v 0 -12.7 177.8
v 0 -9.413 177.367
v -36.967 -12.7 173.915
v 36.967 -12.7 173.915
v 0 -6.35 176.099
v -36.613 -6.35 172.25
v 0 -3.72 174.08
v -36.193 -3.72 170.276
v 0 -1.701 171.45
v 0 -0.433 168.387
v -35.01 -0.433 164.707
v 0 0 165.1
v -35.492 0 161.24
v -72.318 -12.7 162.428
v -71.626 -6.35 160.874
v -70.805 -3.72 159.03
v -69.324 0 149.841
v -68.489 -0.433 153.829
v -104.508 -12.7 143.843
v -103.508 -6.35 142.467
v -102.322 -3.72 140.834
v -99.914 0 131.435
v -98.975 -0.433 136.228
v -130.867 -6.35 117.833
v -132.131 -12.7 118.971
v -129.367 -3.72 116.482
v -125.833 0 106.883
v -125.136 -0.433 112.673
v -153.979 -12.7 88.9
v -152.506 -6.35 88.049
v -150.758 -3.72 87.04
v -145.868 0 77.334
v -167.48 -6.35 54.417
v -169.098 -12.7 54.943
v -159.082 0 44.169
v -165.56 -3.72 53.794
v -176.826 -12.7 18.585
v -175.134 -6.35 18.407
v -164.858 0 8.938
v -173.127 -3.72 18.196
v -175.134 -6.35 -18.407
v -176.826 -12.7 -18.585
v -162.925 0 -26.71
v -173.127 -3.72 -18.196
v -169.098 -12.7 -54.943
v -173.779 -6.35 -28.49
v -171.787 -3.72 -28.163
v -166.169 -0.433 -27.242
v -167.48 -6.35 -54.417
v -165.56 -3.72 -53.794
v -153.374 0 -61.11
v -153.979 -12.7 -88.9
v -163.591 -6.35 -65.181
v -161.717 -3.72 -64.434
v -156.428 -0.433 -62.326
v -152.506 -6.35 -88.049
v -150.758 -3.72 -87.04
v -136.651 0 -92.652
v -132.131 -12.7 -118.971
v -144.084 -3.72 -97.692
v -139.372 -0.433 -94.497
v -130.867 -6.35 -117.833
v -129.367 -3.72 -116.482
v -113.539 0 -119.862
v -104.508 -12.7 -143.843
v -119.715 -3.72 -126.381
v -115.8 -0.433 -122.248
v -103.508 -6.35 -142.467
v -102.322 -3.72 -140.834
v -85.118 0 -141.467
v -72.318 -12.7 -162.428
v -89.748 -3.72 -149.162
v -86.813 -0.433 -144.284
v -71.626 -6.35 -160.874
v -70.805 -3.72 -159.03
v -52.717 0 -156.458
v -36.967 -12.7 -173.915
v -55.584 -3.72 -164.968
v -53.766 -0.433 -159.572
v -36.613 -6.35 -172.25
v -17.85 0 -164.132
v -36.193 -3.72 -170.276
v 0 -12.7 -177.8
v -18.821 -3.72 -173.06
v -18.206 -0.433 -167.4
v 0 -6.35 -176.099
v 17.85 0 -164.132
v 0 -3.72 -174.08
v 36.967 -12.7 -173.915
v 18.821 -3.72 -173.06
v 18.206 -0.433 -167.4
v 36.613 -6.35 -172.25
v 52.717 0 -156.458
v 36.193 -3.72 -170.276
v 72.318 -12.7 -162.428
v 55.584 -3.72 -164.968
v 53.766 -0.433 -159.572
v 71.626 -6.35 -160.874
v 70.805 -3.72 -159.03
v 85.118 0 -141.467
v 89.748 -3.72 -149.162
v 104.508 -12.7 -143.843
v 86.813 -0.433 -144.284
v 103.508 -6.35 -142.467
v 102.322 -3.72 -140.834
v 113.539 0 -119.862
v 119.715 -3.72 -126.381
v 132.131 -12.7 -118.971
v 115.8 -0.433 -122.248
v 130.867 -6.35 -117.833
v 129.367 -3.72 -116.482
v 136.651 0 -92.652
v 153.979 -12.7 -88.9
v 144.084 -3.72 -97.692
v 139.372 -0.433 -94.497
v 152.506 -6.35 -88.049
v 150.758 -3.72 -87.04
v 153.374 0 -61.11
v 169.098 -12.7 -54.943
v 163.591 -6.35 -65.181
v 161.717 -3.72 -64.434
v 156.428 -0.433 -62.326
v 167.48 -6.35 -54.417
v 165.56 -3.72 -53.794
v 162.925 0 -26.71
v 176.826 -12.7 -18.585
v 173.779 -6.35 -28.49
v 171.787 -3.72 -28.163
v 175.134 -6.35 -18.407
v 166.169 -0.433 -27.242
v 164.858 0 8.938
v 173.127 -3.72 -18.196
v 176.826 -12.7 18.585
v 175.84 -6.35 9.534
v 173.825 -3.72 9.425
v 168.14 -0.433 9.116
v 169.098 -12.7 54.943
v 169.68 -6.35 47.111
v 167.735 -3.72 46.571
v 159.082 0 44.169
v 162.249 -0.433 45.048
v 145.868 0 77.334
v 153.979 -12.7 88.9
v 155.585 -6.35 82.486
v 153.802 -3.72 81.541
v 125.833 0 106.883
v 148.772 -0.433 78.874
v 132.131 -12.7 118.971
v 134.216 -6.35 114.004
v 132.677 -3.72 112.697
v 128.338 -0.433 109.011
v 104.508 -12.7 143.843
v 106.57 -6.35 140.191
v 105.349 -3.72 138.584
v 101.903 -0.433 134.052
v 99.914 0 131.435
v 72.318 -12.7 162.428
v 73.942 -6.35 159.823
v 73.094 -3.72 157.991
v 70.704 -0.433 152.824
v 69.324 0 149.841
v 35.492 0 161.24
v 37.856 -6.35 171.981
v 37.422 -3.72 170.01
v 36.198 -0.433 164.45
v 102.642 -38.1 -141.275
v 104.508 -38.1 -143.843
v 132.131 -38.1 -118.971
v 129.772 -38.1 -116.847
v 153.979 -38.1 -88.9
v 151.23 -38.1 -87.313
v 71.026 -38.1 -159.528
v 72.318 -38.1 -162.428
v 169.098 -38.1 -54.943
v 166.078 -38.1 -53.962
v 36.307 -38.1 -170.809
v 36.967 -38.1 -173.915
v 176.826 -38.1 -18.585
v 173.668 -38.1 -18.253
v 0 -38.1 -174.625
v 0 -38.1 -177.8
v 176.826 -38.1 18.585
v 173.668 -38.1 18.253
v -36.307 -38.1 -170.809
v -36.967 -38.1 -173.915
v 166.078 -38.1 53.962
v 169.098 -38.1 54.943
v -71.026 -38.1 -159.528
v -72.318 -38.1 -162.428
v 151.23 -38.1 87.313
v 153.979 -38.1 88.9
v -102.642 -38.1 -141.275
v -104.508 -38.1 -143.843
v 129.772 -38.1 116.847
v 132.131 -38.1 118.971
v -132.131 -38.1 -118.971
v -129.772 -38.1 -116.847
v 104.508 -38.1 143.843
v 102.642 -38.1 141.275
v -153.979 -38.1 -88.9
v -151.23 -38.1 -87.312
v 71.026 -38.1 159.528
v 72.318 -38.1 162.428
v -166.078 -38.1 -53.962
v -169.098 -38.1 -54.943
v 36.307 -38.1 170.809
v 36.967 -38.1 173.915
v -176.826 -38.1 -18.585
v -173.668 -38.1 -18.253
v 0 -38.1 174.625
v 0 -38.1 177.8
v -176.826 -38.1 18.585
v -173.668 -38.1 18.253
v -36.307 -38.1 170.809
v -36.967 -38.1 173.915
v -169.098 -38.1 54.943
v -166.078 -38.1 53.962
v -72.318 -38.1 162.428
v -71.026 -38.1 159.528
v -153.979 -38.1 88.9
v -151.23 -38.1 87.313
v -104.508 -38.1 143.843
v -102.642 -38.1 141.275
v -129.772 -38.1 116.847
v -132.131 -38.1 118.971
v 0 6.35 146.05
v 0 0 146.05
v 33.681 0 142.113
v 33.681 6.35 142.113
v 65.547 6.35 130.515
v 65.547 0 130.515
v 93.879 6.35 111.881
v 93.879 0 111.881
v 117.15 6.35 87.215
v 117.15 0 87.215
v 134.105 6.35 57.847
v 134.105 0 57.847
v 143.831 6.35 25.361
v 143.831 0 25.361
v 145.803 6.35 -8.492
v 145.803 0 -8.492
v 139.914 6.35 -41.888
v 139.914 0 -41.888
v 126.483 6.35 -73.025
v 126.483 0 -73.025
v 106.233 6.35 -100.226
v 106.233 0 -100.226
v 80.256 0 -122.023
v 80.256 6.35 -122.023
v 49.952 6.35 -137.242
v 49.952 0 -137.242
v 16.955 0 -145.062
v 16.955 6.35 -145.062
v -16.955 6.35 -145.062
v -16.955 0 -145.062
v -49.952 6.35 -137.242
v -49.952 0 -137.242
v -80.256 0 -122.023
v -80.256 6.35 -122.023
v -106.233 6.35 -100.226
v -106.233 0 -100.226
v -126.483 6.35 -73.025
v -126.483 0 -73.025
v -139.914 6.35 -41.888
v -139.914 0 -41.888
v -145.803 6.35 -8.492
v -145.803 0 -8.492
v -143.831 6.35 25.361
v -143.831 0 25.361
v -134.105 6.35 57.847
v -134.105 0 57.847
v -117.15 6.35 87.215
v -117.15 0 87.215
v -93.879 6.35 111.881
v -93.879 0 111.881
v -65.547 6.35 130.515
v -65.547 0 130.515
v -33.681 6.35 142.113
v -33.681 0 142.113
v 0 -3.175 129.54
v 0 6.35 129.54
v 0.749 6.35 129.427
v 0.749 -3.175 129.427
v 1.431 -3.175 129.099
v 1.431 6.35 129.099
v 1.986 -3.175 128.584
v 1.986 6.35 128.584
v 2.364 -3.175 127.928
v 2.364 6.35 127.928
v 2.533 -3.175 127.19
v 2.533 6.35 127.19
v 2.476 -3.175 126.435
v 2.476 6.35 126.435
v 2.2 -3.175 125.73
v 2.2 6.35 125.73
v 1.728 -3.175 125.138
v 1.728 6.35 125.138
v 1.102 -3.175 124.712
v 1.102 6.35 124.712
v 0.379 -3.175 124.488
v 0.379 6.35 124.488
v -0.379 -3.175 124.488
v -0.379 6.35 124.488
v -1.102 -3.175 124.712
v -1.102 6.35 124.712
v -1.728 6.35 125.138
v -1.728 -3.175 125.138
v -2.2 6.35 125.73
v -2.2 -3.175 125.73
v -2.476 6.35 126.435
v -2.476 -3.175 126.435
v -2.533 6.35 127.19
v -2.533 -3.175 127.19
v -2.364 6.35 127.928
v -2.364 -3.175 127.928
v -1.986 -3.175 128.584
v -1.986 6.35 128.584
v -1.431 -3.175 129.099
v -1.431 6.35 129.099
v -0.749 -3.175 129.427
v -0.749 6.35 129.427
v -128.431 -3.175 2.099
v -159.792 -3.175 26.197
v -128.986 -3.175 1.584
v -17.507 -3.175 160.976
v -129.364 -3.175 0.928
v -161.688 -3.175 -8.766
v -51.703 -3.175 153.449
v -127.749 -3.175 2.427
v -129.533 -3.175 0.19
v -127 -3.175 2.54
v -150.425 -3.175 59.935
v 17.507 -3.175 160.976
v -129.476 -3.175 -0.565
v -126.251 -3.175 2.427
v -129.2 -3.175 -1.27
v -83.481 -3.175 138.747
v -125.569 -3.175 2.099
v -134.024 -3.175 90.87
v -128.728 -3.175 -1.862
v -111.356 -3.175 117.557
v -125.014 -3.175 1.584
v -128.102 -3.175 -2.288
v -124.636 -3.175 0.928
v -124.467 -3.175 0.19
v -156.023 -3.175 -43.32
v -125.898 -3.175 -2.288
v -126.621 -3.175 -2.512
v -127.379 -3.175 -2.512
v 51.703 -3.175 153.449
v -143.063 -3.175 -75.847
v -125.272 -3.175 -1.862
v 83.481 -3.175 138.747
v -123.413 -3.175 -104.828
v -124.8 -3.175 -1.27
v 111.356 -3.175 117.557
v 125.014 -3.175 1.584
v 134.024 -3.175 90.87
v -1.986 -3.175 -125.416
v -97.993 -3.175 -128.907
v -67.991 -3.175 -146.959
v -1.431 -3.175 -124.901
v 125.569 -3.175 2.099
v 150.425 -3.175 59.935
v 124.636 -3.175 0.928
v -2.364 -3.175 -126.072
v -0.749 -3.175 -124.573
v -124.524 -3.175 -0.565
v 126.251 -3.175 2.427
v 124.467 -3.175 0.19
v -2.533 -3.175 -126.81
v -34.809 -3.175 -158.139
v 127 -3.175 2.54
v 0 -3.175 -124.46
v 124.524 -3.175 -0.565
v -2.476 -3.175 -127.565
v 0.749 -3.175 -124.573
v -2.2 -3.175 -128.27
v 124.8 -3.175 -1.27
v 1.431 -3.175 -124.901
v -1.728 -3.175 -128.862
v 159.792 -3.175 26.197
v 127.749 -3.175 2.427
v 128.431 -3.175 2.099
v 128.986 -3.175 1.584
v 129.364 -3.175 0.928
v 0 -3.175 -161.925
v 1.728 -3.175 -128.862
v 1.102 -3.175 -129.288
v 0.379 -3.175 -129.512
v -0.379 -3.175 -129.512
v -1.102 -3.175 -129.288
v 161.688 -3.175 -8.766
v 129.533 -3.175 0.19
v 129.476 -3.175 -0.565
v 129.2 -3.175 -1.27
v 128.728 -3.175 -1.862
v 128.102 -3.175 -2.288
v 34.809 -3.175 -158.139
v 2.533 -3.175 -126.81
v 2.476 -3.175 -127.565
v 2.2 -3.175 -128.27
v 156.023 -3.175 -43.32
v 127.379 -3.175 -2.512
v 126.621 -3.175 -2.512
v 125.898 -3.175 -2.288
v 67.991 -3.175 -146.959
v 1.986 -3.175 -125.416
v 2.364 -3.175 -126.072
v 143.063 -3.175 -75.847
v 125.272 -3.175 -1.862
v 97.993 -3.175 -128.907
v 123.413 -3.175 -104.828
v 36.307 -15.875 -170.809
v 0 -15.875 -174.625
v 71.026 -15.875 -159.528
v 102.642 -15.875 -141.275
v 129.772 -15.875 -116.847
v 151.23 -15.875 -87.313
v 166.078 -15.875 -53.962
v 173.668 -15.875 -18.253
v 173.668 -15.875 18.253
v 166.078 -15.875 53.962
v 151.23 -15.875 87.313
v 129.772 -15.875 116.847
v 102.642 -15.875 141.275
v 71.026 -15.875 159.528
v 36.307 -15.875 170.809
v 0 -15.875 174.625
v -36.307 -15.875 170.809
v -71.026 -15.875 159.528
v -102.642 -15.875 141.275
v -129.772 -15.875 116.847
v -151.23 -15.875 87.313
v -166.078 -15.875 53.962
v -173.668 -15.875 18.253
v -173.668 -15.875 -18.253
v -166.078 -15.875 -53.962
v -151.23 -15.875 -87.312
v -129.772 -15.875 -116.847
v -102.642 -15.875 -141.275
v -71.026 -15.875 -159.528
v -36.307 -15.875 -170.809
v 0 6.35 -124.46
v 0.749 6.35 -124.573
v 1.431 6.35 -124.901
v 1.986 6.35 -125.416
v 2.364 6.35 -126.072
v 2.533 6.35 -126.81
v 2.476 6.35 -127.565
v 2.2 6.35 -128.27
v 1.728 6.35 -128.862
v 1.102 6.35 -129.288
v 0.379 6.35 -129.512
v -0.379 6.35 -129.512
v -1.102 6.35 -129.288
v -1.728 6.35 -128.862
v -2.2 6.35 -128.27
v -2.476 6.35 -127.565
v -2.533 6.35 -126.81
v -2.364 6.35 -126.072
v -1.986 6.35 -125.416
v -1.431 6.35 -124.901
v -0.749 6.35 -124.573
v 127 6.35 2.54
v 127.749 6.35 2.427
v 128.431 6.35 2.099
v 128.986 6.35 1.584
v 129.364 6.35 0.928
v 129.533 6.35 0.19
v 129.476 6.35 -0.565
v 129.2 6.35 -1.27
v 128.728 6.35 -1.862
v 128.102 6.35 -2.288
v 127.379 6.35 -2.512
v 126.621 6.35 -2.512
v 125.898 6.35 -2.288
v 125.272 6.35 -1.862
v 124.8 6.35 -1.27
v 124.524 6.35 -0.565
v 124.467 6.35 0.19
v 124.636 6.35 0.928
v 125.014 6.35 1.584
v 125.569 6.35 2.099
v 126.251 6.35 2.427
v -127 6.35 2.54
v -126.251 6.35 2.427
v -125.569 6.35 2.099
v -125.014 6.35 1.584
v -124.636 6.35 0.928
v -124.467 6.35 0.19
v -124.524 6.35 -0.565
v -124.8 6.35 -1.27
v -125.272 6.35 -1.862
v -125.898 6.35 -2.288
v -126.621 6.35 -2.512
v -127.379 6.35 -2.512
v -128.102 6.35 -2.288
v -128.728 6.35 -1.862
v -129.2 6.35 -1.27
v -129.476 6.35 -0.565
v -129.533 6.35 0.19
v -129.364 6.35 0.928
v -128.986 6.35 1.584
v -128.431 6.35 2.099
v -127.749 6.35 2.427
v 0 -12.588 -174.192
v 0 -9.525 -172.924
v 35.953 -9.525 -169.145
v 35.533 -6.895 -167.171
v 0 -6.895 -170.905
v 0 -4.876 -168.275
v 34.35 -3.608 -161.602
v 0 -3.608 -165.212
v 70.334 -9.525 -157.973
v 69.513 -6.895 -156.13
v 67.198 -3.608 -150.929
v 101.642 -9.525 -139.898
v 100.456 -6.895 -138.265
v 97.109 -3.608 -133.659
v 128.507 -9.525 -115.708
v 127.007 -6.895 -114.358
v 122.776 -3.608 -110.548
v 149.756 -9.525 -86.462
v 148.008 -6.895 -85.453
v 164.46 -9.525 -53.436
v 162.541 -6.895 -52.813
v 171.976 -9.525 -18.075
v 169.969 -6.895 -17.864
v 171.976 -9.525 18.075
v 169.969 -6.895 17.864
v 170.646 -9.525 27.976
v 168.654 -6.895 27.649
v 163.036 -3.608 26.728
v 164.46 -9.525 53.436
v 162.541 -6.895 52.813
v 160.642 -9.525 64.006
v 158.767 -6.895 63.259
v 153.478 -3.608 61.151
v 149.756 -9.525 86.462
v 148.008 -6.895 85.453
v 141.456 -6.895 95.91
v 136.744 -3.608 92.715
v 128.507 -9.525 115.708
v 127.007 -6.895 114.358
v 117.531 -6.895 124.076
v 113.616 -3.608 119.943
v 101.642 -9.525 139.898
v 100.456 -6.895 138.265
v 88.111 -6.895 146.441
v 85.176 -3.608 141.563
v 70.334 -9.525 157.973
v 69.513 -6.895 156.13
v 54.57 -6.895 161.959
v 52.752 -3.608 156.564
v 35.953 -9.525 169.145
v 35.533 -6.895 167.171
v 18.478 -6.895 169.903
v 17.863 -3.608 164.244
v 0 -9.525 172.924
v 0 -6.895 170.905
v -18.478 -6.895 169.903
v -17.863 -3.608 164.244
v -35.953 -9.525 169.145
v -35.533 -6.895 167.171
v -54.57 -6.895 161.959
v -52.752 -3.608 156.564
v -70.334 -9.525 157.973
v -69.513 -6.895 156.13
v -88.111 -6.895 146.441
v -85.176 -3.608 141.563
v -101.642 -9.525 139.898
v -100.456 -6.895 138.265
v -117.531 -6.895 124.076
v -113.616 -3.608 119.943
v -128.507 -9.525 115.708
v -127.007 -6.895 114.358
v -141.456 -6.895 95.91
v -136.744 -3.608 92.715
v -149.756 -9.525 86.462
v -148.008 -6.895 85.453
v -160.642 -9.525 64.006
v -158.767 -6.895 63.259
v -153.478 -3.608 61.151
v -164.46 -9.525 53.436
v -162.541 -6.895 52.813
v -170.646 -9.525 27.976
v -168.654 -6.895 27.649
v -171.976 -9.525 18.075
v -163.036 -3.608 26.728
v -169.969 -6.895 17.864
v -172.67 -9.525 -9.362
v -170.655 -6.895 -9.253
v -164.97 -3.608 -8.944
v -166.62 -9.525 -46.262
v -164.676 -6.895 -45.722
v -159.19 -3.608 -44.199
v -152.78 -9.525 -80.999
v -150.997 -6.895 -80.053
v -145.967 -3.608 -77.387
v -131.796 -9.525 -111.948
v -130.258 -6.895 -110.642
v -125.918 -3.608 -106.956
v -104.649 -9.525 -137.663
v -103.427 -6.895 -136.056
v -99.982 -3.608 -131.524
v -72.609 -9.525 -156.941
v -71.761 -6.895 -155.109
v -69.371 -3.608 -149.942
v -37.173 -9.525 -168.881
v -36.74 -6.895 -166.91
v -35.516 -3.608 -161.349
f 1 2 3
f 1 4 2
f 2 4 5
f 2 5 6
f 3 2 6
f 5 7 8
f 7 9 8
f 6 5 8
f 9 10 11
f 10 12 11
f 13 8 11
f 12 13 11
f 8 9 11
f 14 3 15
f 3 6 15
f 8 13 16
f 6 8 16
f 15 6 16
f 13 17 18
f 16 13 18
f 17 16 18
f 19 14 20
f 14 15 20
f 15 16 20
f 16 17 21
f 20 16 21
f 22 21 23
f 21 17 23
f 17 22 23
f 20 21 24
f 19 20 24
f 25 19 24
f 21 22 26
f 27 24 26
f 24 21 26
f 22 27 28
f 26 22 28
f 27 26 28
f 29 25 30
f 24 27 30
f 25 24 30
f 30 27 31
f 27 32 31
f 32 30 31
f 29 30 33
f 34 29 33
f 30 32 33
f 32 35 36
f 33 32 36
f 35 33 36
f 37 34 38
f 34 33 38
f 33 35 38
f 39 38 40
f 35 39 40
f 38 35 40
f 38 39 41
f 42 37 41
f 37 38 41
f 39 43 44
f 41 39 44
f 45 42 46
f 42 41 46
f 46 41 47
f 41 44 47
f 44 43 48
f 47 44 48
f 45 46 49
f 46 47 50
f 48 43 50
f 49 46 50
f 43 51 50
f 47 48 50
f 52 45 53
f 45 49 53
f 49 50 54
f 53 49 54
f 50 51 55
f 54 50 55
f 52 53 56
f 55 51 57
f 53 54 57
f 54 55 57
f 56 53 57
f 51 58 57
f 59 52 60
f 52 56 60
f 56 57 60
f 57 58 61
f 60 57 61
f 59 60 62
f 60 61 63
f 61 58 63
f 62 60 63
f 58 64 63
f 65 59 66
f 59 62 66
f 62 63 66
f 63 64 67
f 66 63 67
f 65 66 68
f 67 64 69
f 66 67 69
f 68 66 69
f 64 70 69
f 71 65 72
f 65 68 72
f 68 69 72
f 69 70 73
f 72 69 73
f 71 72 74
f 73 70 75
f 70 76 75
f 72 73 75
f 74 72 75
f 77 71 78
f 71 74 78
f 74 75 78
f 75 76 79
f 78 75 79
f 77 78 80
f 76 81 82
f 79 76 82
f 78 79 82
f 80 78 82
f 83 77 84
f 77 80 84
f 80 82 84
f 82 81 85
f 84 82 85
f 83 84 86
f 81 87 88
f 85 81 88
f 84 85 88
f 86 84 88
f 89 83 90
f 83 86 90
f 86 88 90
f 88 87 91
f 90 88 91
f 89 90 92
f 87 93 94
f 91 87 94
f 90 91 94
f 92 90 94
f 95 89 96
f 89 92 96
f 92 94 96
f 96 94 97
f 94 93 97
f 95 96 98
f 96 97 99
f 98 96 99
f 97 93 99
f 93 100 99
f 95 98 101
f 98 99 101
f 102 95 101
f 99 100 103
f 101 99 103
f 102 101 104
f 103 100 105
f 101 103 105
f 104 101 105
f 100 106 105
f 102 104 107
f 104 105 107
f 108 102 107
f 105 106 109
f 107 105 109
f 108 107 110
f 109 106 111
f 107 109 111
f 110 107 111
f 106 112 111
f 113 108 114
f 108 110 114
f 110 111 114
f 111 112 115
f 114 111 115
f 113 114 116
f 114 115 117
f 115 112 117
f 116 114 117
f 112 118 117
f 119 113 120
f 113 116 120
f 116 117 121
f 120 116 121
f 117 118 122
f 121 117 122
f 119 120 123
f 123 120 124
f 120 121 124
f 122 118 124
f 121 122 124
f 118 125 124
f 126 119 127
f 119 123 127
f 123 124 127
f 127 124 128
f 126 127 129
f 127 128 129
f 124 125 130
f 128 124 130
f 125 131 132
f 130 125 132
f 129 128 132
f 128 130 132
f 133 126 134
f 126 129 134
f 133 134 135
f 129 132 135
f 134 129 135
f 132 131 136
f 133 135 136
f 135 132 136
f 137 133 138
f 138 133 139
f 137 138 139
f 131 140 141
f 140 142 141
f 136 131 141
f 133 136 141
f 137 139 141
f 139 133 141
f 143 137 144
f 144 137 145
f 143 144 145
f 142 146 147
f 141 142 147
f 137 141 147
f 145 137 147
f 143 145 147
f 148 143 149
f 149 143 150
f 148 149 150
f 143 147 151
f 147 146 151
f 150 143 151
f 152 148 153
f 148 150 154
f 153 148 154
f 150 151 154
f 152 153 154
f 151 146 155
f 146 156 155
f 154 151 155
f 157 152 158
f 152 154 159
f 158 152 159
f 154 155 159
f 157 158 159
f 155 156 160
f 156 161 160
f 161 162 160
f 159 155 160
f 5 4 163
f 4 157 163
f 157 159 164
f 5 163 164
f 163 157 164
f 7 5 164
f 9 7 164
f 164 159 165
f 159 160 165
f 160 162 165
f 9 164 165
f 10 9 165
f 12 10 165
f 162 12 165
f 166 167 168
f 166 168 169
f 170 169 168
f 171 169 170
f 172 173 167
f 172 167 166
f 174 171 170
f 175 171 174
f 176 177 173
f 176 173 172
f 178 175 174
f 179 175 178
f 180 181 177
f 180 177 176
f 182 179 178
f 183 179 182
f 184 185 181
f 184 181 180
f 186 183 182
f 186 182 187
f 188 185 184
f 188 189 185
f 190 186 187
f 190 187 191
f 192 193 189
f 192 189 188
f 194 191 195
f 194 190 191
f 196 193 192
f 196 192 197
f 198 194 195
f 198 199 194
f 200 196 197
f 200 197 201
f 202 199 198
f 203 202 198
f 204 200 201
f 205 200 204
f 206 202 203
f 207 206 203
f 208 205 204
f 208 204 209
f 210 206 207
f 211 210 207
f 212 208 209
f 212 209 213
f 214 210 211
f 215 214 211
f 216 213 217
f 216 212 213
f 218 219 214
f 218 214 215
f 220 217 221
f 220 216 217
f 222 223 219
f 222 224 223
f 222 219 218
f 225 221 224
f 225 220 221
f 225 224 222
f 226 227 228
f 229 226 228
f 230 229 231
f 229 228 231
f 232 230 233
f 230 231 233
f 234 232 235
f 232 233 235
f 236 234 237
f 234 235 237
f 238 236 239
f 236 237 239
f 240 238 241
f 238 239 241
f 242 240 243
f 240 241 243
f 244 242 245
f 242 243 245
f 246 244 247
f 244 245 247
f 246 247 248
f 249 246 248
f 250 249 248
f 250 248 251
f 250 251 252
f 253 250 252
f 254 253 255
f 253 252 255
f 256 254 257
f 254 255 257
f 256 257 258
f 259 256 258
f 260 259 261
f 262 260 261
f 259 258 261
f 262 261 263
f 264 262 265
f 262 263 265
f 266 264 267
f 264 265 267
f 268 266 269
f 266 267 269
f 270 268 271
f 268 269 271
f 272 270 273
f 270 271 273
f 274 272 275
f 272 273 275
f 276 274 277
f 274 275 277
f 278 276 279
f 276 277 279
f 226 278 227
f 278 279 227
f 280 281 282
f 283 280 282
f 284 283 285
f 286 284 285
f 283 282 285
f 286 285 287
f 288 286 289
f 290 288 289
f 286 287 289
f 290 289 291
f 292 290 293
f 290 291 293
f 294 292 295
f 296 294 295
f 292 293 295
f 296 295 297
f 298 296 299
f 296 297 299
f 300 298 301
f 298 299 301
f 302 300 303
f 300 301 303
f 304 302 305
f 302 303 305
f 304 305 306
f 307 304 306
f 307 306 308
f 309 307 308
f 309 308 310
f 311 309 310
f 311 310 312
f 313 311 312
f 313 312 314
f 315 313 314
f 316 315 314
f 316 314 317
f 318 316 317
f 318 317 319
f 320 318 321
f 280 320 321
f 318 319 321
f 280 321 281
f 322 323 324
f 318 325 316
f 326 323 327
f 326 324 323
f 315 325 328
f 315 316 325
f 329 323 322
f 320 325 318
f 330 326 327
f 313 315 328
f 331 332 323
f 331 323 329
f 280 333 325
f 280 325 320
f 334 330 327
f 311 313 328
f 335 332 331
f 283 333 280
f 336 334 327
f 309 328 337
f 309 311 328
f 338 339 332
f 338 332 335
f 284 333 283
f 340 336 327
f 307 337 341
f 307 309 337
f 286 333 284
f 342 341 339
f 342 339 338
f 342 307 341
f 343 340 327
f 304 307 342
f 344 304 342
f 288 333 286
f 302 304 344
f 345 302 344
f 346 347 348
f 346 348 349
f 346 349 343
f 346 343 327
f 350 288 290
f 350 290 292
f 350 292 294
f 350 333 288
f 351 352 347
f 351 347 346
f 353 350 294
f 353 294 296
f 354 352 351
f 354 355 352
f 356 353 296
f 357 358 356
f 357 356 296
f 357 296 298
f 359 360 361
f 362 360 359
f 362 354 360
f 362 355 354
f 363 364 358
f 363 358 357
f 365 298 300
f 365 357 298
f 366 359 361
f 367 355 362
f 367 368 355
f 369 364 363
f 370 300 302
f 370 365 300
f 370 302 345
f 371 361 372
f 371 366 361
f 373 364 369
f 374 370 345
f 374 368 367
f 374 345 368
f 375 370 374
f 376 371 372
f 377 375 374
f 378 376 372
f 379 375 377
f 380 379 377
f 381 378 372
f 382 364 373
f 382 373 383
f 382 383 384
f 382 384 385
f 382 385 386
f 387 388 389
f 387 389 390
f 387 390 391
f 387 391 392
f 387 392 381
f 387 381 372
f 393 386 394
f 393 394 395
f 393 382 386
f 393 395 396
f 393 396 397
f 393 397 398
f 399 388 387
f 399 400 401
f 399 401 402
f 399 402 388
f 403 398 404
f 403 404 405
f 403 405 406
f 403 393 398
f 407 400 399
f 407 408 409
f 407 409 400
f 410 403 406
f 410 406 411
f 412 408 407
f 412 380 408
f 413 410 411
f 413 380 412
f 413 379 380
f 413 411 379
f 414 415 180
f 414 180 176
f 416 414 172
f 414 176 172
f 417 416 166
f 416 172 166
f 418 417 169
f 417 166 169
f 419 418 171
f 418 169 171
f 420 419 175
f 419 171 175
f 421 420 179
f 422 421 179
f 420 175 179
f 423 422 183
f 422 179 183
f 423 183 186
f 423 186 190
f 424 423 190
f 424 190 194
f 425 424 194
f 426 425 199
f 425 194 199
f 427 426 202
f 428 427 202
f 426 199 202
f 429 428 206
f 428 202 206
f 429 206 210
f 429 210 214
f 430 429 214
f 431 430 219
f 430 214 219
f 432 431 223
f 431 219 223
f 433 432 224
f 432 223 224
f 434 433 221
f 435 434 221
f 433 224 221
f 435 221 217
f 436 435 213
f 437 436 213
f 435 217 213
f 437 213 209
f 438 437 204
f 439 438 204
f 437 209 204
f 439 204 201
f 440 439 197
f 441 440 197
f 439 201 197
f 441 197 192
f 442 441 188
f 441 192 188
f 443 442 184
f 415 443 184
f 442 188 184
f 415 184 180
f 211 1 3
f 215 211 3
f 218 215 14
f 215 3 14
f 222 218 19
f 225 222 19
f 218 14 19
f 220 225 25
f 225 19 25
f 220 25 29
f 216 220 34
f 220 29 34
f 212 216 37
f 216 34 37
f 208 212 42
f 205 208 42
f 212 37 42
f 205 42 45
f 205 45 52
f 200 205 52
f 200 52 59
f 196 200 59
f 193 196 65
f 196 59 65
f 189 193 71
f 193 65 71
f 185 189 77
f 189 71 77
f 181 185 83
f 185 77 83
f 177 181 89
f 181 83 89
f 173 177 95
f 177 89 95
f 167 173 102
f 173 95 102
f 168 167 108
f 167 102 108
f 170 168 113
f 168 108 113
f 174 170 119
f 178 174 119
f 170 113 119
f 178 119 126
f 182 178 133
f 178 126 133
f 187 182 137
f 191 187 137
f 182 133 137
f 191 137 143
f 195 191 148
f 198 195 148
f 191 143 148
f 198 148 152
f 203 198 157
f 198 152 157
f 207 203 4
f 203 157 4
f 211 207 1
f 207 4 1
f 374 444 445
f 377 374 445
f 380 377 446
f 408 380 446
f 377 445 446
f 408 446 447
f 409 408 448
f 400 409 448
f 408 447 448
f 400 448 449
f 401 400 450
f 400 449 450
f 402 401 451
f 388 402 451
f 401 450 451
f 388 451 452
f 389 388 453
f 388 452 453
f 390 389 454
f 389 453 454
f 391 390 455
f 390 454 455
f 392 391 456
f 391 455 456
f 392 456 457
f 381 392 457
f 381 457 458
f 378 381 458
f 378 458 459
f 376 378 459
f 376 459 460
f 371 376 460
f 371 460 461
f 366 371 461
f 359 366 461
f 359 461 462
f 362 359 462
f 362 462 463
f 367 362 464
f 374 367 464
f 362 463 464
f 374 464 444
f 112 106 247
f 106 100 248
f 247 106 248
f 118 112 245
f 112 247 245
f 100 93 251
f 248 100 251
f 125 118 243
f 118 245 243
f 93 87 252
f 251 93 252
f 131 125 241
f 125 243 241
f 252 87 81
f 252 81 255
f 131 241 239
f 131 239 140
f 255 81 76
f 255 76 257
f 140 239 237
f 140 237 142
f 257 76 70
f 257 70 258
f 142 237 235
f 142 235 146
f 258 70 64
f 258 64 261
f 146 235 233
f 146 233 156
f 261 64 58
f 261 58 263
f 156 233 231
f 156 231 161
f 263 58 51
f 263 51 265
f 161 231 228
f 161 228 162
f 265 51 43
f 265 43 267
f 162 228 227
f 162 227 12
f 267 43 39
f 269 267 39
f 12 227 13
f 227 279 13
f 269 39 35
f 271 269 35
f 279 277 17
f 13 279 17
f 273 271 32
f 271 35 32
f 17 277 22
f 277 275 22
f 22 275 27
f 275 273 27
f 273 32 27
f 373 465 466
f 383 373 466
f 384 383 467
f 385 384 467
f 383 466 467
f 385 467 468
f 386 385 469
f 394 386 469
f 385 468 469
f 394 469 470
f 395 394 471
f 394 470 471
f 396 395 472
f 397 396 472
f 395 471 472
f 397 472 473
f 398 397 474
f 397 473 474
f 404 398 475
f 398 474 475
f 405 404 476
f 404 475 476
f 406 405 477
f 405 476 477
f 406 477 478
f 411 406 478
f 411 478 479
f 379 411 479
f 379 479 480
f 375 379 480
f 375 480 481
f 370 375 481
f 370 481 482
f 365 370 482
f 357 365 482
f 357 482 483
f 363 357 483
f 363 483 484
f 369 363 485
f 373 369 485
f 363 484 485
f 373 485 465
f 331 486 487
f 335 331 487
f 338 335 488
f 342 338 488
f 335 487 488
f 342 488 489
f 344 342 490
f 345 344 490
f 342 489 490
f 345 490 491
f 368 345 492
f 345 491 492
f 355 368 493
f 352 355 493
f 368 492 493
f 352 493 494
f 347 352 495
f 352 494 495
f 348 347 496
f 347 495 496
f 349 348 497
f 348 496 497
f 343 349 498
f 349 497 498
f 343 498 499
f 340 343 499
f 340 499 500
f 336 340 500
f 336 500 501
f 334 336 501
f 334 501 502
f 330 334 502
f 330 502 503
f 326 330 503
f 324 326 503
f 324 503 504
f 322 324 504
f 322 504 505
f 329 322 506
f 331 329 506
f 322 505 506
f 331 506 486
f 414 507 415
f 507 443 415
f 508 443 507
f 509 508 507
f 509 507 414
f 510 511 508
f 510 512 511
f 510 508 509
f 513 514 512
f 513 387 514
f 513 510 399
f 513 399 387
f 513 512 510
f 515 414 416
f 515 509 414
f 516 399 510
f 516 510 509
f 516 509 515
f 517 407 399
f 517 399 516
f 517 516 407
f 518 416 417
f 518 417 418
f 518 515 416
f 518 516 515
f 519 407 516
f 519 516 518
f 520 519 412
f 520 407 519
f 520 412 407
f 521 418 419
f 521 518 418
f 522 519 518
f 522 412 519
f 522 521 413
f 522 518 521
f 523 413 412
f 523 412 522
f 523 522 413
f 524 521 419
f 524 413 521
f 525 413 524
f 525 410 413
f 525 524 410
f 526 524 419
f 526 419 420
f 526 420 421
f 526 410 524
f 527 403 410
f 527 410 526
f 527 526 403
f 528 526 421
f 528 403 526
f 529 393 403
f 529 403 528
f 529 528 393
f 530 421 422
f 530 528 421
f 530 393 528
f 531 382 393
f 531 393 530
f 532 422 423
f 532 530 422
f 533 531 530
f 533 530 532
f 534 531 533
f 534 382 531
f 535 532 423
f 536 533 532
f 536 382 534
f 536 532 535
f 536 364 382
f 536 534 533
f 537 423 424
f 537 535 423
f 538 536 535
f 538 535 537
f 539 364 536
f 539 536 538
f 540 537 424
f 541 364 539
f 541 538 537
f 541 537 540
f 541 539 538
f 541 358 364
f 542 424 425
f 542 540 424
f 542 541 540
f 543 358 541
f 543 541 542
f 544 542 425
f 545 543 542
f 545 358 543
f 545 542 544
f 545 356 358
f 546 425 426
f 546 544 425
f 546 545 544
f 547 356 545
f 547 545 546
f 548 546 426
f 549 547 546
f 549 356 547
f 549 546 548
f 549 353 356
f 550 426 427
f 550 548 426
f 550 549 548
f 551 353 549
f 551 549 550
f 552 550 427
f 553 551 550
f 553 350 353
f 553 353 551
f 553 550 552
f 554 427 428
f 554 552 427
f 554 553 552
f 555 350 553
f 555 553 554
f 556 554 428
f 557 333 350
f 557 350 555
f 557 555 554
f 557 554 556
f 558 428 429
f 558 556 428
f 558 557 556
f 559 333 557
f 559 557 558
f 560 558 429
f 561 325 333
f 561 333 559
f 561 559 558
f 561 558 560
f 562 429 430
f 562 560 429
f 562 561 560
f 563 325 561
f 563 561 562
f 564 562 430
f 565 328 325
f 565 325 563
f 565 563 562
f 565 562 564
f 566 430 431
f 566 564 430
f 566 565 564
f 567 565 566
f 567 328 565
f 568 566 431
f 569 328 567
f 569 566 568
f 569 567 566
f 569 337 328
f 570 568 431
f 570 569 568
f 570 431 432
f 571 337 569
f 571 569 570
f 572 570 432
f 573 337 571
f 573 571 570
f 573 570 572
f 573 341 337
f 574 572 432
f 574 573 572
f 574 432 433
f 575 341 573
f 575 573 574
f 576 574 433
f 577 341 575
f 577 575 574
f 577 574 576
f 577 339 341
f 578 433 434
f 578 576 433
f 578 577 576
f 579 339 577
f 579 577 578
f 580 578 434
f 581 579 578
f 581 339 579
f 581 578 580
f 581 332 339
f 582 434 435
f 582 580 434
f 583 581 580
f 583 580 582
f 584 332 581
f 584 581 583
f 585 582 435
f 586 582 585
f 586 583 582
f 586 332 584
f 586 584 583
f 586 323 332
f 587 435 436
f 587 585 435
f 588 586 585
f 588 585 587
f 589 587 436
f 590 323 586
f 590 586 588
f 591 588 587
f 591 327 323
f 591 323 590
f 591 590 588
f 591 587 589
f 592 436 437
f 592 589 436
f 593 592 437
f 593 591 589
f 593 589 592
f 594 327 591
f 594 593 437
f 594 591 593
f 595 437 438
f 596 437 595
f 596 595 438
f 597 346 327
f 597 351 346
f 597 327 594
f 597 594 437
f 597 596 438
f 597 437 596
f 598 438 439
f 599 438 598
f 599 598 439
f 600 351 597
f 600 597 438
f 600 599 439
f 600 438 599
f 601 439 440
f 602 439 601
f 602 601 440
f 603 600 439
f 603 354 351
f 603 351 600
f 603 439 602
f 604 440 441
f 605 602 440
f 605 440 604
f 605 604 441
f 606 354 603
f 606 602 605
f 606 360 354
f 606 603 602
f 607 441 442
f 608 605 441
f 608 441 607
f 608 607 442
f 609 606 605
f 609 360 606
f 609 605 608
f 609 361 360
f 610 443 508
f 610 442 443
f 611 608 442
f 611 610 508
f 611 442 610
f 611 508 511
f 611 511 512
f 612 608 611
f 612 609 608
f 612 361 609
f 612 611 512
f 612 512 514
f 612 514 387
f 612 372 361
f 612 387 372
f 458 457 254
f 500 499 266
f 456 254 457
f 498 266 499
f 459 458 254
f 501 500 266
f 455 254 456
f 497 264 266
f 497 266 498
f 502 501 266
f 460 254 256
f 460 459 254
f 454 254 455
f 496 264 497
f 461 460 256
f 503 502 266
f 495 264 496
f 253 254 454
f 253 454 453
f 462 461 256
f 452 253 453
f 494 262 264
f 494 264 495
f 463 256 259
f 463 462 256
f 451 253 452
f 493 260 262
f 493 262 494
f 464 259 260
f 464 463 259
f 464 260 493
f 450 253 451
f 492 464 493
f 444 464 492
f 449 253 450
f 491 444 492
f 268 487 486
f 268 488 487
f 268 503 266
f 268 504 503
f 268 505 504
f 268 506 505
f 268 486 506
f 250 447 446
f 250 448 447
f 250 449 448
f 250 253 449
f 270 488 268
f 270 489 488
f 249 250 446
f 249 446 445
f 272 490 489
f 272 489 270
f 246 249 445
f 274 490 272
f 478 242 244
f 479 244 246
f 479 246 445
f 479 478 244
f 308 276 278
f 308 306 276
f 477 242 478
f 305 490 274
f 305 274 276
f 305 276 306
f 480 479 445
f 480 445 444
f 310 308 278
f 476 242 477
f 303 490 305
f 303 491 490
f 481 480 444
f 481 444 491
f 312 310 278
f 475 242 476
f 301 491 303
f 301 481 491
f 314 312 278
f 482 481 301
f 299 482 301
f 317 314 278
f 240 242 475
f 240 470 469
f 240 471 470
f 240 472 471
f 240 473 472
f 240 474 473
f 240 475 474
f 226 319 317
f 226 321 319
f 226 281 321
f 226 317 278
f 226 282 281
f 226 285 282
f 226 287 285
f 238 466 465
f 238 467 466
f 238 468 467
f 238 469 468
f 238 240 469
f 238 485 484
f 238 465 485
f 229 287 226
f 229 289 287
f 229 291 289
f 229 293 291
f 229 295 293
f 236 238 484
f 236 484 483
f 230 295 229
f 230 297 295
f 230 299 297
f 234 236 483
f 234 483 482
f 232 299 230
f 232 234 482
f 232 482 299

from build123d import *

# Parameters (mm, degrees)
SKETCH1_R           = 146.05
BOSS_EXTRUDE1_DEPTH = 6.35
SKETCH2_R           = 177.8
BOSS_EXTRUDE2_DEPTH = 38.1
SKETCH3_R           = 174.625
CUT_EXTRUDE2_DEPTH  = 34.925
FILLET2_R           = 12.7
FILLET3_R           = 12.7
SKETCH4_R           = 2.54
CUT_EXTRUDE3_DEPTH  = 9.525


with BuildPart() as part:
    # Sketch1 → Boss-Extrude1 (new body)
    with BuildSketch(Plane(origin=(0, 0, 0), x_dir=(1, 0, 0), z_dir=(0, 1, 0))):
        with Locations(Location((0, 0, 0), (0, 0, 270))):
            Circle(SKETCH1_R)
    extrude(amount=BOSS_EXTRUDE1_DEPTH)

    # Sketch2 → Boss-Extrude2 (add)
    with BuildSketch(Plane.XZ):
        with Locations(Location((0, 0, 0), (0, 0, 90))):
            Circle(SKETCH2_R)
    extrude(amount=BOSS_EXTRUDE2_DEPTH)

    # Sketch3 → Cut-Extrude2 (cut)
    with BuildSketch(Plane.XZ.offset(38.1)):
        with Locations(Location((0, 0, 0), (0, 0, 270))):
            Circle(SKETCH3_R)
    extrude(amount=-CUT_EXTRUDE2_DEPTH, mode=Mode.SUBTRACT)

    # Fillet2
    fillet2_edges = [part.edges().sort_by_distance(p)[0] for p in [
        (0, -3.175, 174.625),
    ]]
    fillet(fillet2_edges, radius=FILLET2_R)

    # Fillet3
    fillet3_edges = [part.edges().sort_by_distance(p)[0] for p in [
        (0, 0, -177.8),
    ]]
    fillet(fillet3_edges, radius=FILLET3_R)

    # Sketch4 → Cut-Extrude3 (cut)
    with BuildSketch(Plane(origin=(0, 6.35, 0), x_dir=(1, 0, 0), z_dir=(0, 1, 0))):
        with Locations(Location((0, 127, 0), (0, 0, 270))):
            Circle(SKETCH4_R)
        with Locations(Location((127, 0, 0), (0, 0, 270))):
            Circle(SKETCH4_R)
        with Locations(Location((-127, 0, 0), (0, 0, 270))):
            Circle(SKETCH4_R)
        with Locations(Location((0, -127, 0), (0, 0, 270))):
            Circle(SKETCH4_R)
    extrude(amount=-CUT_EXTRUDE3_DEPTH, mode=Mode.SUBTRACT)


solid = part.part
